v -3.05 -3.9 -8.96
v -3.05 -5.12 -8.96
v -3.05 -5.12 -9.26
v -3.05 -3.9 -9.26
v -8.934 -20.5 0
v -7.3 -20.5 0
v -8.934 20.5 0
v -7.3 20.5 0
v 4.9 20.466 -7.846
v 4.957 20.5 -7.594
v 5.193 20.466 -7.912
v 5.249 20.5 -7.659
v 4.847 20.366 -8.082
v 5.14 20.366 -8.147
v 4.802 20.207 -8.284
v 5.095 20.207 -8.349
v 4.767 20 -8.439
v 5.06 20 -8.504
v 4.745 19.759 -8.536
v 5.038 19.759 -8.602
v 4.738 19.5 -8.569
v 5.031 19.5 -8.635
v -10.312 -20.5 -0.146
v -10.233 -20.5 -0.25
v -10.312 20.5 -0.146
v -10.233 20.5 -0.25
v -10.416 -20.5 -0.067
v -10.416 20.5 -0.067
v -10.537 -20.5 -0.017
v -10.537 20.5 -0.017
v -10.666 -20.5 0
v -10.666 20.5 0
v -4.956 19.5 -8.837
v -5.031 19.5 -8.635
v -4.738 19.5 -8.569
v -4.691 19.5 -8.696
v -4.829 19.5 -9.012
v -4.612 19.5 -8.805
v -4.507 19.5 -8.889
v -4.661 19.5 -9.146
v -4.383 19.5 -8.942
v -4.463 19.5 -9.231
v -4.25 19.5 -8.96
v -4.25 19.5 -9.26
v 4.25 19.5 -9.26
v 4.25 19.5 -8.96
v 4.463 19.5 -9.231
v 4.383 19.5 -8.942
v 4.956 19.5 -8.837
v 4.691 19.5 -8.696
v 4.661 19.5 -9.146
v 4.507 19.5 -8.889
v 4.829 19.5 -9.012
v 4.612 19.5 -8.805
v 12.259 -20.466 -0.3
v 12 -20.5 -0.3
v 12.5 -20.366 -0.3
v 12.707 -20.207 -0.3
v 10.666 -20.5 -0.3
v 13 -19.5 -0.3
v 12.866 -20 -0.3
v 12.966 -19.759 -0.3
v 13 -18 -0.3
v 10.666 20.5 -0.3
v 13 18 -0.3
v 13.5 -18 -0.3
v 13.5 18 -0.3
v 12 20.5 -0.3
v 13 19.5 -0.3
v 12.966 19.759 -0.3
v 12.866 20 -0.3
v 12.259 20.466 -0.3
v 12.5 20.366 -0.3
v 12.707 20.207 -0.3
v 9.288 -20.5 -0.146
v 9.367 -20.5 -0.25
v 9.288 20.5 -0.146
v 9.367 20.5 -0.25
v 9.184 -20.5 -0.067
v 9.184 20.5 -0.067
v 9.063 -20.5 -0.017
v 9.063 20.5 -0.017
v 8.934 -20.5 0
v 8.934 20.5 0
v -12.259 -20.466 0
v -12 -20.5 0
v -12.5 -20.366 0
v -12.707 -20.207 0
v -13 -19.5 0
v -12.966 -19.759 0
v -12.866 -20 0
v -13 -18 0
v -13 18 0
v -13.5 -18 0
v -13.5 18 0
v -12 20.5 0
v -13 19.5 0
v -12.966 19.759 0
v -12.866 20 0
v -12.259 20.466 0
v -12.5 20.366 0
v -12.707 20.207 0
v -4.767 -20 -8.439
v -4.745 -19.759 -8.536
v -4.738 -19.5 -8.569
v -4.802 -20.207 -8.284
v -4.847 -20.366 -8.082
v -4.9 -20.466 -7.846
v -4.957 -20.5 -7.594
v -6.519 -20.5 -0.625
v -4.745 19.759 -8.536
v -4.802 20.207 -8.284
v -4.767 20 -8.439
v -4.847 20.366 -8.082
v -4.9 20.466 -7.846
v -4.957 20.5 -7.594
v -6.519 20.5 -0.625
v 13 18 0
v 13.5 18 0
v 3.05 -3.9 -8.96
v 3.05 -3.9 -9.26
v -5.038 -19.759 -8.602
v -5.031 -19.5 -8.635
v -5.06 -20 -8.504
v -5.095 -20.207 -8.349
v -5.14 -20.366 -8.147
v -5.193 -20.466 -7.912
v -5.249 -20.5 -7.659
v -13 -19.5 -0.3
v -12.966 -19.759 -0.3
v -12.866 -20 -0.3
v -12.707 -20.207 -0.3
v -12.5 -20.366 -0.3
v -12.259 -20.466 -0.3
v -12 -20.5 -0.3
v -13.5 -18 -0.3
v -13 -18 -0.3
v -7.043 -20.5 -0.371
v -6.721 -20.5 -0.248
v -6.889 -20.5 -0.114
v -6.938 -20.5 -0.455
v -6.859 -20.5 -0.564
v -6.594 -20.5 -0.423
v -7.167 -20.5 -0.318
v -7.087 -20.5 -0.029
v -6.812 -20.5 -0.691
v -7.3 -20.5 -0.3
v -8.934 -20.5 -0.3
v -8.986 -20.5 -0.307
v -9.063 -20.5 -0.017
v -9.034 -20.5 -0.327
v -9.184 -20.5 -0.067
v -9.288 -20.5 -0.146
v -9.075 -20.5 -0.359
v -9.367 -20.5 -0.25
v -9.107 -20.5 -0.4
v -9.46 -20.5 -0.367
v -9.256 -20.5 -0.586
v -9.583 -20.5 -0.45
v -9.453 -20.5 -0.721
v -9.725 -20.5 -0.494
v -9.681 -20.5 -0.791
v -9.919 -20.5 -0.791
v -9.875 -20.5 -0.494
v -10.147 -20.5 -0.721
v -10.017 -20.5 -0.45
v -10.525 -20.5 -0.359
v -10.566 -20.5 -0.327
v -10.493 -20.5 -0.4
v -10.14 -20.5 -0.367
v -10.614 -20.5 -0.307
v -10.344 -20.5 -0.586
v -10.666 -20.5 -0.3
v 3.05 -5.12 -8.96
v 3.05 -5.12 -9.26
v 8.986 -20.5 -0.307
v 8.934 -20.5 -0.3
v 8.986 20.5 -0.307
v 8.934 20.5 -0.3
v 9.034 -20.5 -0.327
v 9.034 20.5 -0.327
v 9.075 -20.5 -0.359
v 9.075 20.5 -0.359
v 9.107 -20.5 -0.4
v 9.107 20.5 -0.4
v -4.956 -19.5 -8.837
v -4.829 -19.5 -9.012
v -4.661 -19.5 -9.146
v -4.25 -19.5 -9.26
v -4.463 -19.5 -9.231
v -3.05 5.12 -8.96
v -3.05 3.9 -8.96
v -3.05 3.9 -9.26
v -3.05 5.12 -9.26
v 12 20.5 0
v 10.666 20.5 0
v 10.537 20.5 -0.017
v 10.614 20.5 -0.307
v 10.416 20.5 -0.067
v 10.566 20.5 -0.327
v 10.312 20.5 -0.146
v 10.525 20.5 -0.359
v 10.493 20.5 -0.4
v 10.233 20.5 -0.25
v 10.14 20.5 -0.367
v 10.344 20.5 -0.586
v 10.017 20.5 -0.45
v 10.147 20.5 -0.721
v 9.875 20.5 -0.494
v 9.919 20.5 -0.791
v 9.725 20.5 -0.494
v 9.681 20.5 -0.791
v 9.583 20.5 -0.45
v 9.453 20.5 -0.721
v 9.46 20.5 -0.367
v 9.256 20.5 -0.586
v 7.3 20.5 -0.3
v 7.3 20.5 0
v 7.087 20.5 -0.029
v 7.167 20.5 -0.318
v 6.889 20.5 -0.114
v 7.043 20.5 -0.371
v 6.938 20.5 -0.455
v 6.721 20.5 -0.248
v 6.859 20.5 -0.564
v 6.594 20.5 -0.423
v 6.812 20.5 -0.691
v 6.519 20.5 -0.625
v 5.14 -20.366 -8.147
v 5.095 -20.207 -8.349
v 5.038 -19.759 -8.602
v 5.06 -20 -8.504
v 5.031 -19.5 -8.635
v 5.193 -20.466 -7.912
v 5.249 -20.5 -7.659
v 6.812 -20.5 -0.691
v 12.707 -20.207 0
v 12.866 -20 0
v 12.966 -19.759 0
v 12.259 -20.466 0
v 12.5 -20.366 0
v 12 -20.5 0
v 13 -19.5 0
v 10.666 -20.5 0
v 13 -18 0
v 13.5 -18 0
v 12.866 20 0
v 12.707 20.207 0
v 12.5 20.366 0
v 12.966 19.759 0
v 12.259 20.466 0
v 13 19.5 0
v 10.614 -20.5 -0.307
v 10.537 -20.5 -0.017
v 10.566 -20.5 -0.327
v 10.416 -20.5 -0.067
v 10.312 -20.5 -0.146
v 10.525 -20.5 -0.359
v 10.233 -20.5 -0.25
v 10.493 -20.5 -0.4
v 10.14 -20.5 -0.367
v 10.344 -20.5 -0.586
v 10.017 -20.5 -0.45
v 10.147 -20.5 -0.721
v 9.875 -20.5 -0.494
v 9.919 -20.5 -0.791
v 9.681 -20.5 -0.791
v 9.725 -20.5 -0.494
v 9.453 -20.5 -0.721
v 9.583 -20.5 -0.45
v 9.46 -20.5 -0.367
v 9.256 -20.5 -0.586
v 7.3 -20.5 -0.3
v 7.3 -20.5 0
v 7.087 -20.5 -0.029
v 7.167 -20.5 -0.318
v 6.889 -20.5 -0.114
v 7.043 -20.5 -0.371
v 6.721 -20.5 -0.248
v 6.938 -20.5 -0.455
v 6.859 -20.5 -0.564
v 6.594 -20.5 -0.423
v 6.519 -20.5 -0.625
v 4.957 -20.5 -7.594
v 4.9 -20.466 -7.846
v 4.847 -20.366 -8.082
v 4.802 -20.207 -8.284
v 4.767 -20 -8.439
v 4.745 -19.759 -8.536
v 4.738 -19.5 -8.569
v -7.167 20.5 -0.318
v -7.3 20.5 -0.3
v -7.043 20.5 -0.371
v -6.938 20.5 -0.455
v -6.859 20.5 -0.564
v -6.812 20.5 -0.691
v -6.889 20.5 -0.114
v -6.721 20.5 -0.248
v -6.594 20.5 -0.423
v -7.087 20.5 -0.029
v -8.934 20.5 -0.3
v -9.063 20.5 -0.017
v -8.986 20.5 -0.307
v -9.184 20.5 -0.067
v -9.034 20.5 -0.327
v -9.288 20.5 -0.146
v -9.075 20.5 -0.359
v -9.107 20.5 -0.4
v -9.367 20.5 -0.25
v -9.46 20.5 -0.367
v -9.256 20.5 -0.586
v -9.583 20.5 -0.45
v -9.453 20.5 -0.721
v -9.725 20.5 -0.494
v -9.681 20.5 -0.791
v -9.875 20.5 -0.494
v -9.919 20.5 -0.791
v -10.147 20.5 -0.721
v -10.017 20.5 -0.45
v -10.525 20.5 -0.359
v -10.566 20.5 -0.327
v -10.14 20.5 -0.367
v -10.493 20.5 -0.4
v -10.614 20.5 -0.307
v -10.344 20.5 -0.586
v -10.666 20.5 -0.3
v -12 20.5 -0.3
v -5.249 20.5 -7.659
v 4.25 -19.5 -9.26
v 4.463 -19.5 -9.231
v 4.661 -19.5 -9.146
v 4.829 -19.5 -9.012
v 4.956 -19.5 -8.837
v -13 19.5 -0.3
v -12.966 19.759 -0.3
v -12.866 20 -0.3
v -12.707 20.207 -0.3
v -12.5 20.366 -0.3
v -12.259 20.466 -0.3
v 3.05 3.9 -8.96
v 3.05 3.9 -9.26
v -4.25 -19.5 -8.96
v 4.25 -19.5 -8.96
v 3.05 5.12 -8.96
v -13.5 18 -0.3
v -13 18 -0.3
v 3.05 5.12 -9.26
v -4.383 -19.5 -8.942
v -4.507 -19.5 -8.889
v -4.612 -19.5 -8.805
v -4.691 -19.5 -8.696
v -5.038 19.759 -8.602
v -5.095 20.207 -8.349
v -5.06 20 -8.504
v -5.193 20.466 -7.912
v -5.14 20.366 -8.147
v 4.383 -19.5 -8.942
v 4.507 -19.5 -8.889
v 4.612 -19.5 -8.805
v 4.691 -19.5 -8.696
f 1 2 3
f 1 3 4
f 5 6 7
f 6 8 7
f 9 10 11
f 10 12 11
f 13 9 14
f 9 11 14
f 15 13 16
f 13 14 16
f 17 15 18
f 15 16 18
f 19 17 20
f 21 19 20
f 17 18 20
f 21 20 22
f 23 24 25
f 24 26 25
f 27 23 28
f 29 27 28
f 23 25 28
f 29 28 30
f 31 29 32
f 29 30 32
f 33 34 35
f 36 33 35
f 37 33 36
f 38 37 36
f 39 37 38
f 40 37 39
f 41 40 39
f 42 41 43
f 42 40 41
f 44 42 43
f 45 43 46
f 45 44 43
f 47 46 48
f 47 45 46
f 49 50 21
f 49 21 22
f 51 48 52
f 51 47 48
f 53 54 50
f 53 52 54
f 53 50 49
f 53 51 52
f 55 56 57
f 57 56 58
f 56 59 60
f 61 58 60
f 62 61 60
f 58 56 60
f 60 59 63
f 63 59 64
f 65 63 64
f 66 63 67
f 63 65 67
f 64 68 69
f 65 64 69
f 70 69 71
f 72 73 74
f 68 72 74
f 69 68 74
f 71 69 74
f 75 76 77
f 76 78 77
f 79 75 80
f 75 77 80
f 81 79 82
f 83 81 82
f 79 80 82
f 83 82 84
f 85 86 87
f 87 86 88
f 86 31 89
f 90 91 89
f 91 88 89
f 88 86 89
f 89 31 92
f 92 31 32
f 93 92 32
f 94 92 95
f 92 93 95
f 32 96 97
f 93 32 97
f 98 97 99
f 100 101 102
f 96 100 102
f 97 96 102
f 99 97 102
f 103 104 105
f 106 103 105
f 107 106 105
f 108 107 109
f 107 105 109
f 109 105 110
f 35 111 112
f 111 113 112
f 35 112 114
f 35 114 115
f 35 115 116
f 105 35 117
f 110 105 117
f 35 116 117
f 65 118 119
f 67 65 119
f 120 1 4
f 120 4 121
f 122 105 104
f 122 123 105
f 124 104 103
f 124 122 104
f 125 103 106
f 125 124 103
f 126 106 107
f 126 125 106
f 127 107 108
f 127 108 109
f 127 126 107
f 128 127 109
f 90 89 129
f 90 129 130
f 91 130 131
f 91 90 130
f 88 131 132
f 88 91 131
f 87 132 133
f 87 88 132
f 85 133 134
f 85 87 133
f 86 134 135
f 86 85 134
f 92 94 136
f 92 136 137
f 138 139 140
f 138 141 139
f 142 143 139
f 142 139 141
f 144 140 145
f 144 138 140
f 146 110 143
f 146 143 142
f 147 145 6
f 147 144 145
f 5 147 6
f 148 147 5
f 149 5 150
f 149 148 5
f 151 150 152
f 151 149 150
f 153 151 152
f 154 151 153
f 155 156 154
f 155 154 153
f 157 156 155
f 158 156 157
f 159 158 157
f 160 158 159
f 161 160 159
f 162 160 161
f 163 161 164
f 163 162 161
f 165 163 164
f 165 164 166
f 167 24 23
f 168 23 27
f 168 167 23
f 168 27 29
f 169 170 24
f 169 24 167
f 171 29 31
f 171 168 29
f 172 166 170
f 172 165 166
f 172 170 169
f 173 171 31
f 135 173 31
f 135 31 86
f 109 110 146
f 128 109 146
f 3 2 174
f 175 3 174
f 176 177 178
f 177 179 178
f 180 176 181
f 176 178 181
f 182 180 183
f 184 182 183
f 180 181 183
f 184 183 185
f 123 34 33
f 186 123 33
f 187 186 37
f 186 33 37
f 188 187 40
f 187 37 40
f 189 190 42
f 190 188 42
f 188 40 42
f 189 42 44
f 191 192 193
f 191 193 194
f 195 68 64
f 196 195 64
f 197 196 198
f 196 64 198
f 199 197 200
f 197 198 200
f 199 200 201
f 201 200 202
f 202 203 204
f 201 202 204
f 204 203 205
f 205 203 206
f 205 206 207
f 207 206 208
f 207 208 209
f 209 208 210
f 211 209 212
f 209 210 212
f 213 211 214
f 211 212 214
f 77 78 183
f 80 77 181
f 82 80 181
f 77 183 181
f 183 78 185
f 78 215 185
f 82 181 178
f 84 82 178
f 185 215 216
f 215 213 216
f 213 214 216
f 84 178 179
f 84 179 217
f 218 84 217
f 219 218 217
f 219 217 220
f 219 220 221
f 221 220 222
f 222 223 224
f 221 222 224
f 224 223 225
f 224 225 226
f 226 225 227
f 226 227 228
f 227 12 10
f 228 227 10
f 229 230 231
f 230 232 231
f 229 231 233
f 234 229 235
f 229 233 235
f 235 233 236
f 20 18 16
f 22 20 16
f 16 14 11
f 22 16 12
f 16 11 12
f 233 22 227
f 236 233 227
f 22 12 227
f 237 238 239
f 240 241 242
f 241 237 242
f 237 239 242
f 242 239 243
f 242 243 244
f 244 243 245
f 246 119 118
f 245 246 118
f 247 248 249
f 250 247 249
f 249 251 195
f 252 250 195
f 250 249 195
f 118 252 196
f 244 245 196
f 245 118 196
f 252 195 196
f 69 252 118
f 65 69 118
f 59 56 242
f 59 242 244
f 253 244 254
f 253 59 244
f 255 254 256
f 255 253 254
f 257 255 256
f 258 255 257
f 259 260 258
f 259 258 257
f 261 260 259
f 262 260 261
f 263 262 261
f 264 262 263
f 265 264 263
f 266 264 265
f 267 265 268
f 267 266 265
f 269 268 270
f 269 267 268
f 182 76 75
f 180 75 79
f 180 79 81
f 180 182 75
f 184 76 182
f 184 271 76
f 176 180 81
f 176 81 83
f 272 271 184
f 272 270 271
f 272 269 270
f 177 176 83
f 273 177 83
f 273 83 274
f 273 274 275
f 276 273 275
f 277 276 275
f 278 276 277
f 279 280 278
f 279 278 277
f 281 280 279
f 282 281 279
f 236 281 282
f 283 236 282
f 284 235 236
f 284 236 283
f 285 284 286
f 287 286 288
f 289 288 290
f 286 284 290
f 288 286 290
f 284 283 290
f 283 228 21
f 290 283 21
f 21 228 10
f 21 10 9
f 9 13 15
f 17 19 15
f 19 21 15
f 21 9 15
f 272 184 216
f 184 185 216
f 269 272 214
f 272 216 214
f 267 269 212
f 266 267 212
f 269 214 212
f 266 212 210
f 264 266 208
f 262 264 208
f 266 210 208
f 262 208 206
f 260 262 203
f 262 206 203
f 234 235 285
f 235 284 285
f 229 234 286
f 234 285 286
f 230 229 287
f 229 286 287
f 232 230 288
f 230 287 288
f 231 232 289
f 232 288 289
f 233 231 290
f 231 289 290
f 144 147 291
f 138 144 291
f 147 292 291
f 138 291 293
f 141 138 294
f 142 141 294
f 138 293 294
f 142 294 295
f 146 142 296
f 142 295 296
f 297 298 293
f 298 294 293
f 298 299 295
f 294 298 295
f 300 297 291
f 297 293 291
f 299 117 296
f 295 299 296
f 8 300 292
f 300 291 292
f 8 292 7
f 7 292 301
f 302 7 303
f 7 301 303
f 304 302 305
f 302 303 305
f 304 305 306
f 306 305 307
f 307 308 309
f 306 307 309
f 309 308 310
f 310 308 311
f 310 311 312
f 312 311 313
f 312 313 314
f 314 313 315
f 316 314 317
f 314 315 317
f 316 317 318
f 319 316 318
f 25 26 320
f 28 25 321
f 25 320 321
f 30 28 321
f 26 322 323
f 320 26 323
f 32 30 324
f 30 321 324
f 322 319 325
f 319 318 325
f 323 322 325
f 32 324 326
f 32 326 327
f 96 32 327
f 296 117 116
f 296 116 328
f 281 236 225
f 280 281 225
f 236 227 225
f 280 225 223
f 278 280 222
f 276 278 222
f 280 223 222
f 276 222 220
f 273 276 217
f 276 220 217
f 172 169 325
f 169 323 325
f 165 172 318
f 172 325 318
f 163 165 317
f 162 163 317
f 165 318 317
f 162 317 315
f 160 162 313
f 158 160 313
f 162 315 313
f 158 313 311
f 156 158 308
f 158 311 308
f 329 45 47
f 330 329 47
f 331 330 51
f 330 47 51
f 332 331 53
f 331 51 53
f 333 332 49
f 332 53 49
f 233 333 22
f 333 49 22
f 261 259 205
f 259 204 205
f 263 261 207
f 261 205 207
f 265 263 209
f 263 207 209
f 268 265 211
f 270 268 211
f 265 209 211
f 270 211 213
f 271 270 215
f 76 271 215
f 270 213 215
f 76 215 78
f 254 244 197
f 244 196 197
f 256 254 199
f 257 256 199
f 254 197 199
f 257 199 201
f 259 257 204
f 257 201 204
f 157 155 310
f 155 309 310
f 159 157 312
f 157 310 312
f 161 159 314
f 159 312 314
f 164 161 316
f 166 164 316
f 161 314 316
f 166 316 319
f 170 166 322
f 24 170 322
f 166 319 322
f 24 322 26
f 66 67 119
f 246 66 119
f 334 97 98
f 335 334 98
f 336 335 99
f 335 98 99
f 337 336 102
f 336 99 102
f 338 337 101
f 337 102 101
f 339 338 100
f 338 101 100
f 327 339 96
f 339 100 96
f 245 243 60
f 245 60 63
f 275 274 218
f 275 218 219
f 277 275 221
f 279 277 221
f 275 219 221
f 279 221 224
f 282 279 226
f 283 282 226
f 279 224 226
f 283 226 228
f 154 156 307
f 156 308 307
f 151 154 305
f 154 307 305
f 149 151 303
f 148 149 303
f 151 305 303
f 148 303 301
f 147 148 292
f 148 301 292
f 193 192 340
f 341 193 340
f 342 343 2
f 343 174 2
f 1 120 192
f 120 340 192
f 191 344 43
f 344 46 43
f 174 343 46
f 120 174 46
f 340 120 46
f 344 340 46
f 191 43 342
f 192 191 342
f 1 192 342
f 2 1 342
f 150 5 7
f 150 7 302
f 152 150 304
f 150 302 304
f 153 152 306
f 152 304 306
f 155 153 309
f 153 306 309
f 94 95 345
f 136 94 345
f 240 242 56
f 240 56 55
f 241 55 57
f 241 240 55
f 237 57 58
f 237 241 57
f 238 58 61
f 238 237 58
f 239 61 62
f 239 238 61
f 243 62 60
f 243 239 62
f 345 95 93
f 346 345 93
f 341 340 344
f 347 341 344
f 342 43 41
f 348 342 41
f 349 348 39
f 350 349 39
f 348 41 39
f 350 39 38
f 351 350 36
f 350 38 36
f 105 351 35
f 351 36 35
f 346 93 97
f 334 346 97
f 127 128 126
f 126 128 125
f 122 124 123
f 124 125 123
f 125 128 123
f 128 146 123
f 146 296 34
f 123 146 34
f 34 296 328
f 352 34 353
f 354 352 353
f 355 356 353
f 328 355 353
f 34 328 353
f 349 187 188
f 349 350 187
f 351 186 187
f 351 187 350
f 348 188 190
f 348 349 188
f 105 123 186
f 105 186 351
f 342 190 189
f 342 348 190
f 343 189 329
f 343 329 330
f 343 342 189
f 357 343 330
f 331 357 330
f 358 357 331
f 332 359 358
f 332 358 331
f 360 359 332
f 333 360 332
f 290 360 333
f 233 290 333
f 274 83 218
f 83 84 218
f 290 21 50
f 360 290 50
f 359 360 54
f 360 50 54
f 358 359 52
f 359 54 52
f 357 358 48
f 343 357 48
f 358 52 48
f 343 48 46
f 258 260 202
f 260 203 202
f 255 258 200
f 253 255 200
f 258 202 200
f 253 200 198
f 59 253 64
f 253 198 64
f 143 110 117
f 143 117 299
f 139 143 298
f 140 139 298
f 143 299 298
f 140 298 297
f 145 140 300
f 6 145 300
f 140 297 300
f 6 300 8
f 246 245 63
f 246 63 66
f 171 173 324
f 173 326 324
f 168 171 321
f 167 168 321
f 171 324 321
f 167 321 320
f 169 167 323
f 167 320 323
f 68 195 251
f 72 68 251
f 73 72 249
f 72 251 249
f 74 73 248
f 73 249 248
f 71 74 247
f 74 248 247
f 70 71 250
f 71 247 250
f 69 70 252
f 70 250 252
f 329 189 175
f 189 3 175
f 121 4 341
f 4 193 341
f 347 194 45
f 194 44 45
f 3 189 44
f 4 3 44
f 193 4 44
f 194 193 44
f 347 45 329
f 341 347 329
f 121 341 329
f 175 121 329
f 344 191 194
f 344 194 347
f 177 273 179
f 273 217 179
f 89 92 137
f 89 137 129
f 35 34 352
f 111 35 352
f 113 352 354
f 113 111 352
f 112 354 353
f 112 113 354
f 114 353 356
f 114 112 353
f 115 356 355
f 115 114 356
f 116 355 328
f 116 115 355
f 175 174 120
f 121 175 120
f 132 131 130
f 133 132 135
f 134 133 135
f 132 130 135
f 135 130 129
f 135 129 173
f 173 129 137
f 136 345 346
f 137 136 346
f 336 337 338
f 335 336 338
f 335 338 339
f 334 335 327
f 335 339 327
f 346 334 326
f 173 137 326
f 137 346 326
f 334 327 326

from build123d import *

# Parameters (mm, degrees)
EXTRUDE_THIN1_DEPTH = 20.5
EXTRUDE1_DEPTH      = 41
EXTRUDE2_DEPTH      = 1
FILLET1_R           = 1
EXTRUDE3_DEPTH      = 1
FILLET2_R           = 1
SKETCH5_W           = 6.1
SKETCH5_H           = 1.22
EXTRUDE4_DEPTH      = 45.5


with BuildPart() as part:
    # Sketch1 → Extrude-Thin1 (new, symmetric)
    with BuildSketch(Plane(origin=(0, 0, 0), x_dir=(1, 0, 0), z_dir=(0, 1, 0))):
        with BuildLine():
            Line((13.5, 0), (10.666025404, 0))
            ThreePointArc((10.666025404, 0), (10.416025404, 0.066987298), (10.233012702, 0.25))
            ThreePointArc((10.233012702, 0.25), (9.8, 0.5), (9.366987298, 0.25))
            ThreePointArc((9.366987298, 0.25), (9.183974596, 0.066987298), (8.933974596, 0))
            Line((8.933974596, 0), (7.3, 0))
            ThreePointArc((7.3, 0), (6.800019439, 0.175484637), (6.519386146, 0.624951403))
            Line((6.519386146, 0.624951403), (4.737883659, 8.569405373))
            ThreePointArc((4.737883659, 8.569405373), (4.56248785, 8.850322102), (4.25, 8.96))
            Line((4.25, 8.96), (-4.25, 8.96))
            ThreePointArc((-4.25, 8.96), (-4.56248785, 8.850322102), (-4.737883659, 8.569405373))
            Line((-4.737883659, 8.569405373), (-6.519386146, 0.624951403))
            ThreePointArc((-6.519386146, 0.624951403), (-6.800019439, 0.175484637), (-7.3, 0))
            Line((-7.3, 0), (-8.933974596, 0))
            ThreePointArc((-8.933974596, 0), (-9.183974596, 0.066987298), (-9.366987298, 0.25))
            ThreePointArc((-9.366987298, 0.25), (-9.8, 0.5), (-10.233012702, 0.25))
            ThreePointArc((-10.233012702, 0.25), (-10.416025404, 0.066987298), (-10.666025404, 0))
            Line((-10.666025404, 0), (-13.5, 0))
            Line((-13.5, 0), (-13.5, 0.3))
            Line((-13.5, 0.3), (-10.666025404, 0.3))
            ThreePointArc((-10.666025404, 0.3), (-10.566025404, 0.326794919), (-10.492820323, 0.4))
            ThreePointArc((-10.492820323, 0.4), (-9.8, 0.8), (-9.107179677, 0.4))
            ThreePointArc((-9.107179677, 0.4), (-9.033974596, 0.326794919), (-8.933974596, 0.3))
            Line((-8.933974596, 0.3), (-7.3, 0.3))
            ThreePointArc((-7.3, 0.3), (-6.98751215, 0.409677898), (-6.812116341, 0.690594627))
            Line((-6.812116341, 0.690594627), (-5.030613854, 8.635048597))
            ThreePointArc((-5.030613854, 8.635048597), (-4.749980561, 9.084515363), (-4.25, 9.26))
            Line((-4.25, 9.26), (4.25, 9.26))
            ThreePointArc((4.25, 9.26), (4.749980561, 9.084515363), (5.030613854, 8.635048597))
            Line((5.030613854, 8.635048597), (6.812116341, 0.690594627))
            ThreePointArc((6.812116341, 0.690594627), (6.98751215, 0.409677898), (7.3, 0.3))
            Line((7.3, 0.3), (8.933974596, 0.3))
            ThreePointArc((8.933974596, 0.3), (9.033974596, 0.326794919), (9.107179677, 0.4))
            ThreePointArc((9.107179677, 0.4), (9.8, 0.8), (10.492820323, 0.4))
            ThreePointArc((10.492820323, 0.4), (10.566025404, 0.326794919), (10.666025404, 0.3))
            Line((10.666025404, 0.3), (13.5, 0.3))
            Line((13.5, 0.3), (13.5, 0))
        make_face()
    extrude(amount=EXTRUDE_THIN1_DEPTH, both=True)

    # Sketch2 → Extrude1 (cut)
    with BuildSketch(Plane.XY):
        with BuildLine():
            Line((-13.5, 18), (-13, 18))
            Line((-13, 18), (-13, 19.5))
            ThreePointArc((-13, 19.5), (-12.707106781, 20.207106781), (-12, 20.5))
            Line((-12, 20.5), (0, 20.5))
            Line((0, 20.5), (12, 20.5))
            ThreePointArc((12, 20.5), (12.707106781, 20.207106781), (13, 19.5))
            Line((13, 19.5), (13, 18))
            Line((13, 18), (13.5, 18))
            Line((13.5, 18), (13.5, 21.5))
            Line((13.5, 21.5), (-13.5, 21.5))
            Line((-13.5, 21.5), (-13.5, 18))
        make_face()
        with BuildLine():
            Line((-13.5, -18), (-13, -18))
            Line((-13, -18), (-13, -19.5))
            ThreePointArc((-13, -19.5), (-12.707106781, -20.207106781), (-12, -20.5))
            Line((-12, -20.5), (12, -20.5))
            ThreePointArc((12, -20.5), (12.707106781, -20.207106781), (13, -19.5))
            Line((13, -19.5), (13, -18))
            Line((13, -18), (13.5, -18))
            Line((13.5, -18), (13.5, -21.5))
            Line((13.5, -21.5), (-13.5, -21.5))
            Line((-13.5, -21.5), (-13.5, -18))
        make_face()
    extrude(amount=-EXTRUDE1_DEPTH, mode=Mode.SUBTRACT)

    # Sketch3 → Extrude2 (cut)
    with BuildSketch(Plane(origin=(0, 20.5, 0), x_dir=(1, 0, 0), z_dir=(0, 1, 0))):
        Polygon((-5.030613854, 8.635048597), (-4.737883659, 8.569405373), (4.737883659, 8.569405373), (5.030613854, 8.635048597), (5.030613854, 9.569405373), (-5.030613854, 9.569405373), align=None)
    extrude(amount=-EXTRUDE2_DEPTH, mode=Mode.SUBTRACT)

    # Fillet1
    fillet1_edges = [part.edges().sort_by_distance(p)[0] for p in [
        (-4.884248756, 20.5, -8.602226985),
        (4.884248756, 20.5, -8.602226985),
    ]]
    fillet(fillet1_edges, radius=FILLET1_R - 0.0001)  # a hair under: the kernel refuses the full size

    # Sketch4 → Extrude3 (cut)
    with BuildSketch(Plane.XZ.offset(20.5)):
        Polygon((-4.737883659, -8.569405373), (-5.030613854, -8.635048597), (-5.030613854, -10.26), (5.030613854, -10.26), (5.030613854, -8.635048597), (4.737883659, -8.569405373), align=None)
    extrude(amount=-EXTRUDE3_DEPTH, mode=Mode.SUBTRACT)

    # Fillet2
    fillet2_edges = [part.edges().sort_by_distance(p)[0] for p in [
        (4.884248756, -20.5, -8.602226985),
        (-4.884248756, -20.5, -8.602226985),
    ]]
    fillet(fillet2_edges, radius=FILLET2_R - 0.0001)  # a hair under: the kernel refuses the full size

    # Sketch5 → Extrude4 (cut)
    with BuildSketch(Plane.XY):
        with Locations((0, 4.51)):
            Rectangle(SKETCH5_W, SKETCH5_H)
        with Locations((0, -4.51)):
            Rectangle(SKETCH5_W, SKETCH5_H)
    extrude(amount=-EXTRUDE4_DEPTH, mode=Mode.SUBTRACT)


solid = part.part
